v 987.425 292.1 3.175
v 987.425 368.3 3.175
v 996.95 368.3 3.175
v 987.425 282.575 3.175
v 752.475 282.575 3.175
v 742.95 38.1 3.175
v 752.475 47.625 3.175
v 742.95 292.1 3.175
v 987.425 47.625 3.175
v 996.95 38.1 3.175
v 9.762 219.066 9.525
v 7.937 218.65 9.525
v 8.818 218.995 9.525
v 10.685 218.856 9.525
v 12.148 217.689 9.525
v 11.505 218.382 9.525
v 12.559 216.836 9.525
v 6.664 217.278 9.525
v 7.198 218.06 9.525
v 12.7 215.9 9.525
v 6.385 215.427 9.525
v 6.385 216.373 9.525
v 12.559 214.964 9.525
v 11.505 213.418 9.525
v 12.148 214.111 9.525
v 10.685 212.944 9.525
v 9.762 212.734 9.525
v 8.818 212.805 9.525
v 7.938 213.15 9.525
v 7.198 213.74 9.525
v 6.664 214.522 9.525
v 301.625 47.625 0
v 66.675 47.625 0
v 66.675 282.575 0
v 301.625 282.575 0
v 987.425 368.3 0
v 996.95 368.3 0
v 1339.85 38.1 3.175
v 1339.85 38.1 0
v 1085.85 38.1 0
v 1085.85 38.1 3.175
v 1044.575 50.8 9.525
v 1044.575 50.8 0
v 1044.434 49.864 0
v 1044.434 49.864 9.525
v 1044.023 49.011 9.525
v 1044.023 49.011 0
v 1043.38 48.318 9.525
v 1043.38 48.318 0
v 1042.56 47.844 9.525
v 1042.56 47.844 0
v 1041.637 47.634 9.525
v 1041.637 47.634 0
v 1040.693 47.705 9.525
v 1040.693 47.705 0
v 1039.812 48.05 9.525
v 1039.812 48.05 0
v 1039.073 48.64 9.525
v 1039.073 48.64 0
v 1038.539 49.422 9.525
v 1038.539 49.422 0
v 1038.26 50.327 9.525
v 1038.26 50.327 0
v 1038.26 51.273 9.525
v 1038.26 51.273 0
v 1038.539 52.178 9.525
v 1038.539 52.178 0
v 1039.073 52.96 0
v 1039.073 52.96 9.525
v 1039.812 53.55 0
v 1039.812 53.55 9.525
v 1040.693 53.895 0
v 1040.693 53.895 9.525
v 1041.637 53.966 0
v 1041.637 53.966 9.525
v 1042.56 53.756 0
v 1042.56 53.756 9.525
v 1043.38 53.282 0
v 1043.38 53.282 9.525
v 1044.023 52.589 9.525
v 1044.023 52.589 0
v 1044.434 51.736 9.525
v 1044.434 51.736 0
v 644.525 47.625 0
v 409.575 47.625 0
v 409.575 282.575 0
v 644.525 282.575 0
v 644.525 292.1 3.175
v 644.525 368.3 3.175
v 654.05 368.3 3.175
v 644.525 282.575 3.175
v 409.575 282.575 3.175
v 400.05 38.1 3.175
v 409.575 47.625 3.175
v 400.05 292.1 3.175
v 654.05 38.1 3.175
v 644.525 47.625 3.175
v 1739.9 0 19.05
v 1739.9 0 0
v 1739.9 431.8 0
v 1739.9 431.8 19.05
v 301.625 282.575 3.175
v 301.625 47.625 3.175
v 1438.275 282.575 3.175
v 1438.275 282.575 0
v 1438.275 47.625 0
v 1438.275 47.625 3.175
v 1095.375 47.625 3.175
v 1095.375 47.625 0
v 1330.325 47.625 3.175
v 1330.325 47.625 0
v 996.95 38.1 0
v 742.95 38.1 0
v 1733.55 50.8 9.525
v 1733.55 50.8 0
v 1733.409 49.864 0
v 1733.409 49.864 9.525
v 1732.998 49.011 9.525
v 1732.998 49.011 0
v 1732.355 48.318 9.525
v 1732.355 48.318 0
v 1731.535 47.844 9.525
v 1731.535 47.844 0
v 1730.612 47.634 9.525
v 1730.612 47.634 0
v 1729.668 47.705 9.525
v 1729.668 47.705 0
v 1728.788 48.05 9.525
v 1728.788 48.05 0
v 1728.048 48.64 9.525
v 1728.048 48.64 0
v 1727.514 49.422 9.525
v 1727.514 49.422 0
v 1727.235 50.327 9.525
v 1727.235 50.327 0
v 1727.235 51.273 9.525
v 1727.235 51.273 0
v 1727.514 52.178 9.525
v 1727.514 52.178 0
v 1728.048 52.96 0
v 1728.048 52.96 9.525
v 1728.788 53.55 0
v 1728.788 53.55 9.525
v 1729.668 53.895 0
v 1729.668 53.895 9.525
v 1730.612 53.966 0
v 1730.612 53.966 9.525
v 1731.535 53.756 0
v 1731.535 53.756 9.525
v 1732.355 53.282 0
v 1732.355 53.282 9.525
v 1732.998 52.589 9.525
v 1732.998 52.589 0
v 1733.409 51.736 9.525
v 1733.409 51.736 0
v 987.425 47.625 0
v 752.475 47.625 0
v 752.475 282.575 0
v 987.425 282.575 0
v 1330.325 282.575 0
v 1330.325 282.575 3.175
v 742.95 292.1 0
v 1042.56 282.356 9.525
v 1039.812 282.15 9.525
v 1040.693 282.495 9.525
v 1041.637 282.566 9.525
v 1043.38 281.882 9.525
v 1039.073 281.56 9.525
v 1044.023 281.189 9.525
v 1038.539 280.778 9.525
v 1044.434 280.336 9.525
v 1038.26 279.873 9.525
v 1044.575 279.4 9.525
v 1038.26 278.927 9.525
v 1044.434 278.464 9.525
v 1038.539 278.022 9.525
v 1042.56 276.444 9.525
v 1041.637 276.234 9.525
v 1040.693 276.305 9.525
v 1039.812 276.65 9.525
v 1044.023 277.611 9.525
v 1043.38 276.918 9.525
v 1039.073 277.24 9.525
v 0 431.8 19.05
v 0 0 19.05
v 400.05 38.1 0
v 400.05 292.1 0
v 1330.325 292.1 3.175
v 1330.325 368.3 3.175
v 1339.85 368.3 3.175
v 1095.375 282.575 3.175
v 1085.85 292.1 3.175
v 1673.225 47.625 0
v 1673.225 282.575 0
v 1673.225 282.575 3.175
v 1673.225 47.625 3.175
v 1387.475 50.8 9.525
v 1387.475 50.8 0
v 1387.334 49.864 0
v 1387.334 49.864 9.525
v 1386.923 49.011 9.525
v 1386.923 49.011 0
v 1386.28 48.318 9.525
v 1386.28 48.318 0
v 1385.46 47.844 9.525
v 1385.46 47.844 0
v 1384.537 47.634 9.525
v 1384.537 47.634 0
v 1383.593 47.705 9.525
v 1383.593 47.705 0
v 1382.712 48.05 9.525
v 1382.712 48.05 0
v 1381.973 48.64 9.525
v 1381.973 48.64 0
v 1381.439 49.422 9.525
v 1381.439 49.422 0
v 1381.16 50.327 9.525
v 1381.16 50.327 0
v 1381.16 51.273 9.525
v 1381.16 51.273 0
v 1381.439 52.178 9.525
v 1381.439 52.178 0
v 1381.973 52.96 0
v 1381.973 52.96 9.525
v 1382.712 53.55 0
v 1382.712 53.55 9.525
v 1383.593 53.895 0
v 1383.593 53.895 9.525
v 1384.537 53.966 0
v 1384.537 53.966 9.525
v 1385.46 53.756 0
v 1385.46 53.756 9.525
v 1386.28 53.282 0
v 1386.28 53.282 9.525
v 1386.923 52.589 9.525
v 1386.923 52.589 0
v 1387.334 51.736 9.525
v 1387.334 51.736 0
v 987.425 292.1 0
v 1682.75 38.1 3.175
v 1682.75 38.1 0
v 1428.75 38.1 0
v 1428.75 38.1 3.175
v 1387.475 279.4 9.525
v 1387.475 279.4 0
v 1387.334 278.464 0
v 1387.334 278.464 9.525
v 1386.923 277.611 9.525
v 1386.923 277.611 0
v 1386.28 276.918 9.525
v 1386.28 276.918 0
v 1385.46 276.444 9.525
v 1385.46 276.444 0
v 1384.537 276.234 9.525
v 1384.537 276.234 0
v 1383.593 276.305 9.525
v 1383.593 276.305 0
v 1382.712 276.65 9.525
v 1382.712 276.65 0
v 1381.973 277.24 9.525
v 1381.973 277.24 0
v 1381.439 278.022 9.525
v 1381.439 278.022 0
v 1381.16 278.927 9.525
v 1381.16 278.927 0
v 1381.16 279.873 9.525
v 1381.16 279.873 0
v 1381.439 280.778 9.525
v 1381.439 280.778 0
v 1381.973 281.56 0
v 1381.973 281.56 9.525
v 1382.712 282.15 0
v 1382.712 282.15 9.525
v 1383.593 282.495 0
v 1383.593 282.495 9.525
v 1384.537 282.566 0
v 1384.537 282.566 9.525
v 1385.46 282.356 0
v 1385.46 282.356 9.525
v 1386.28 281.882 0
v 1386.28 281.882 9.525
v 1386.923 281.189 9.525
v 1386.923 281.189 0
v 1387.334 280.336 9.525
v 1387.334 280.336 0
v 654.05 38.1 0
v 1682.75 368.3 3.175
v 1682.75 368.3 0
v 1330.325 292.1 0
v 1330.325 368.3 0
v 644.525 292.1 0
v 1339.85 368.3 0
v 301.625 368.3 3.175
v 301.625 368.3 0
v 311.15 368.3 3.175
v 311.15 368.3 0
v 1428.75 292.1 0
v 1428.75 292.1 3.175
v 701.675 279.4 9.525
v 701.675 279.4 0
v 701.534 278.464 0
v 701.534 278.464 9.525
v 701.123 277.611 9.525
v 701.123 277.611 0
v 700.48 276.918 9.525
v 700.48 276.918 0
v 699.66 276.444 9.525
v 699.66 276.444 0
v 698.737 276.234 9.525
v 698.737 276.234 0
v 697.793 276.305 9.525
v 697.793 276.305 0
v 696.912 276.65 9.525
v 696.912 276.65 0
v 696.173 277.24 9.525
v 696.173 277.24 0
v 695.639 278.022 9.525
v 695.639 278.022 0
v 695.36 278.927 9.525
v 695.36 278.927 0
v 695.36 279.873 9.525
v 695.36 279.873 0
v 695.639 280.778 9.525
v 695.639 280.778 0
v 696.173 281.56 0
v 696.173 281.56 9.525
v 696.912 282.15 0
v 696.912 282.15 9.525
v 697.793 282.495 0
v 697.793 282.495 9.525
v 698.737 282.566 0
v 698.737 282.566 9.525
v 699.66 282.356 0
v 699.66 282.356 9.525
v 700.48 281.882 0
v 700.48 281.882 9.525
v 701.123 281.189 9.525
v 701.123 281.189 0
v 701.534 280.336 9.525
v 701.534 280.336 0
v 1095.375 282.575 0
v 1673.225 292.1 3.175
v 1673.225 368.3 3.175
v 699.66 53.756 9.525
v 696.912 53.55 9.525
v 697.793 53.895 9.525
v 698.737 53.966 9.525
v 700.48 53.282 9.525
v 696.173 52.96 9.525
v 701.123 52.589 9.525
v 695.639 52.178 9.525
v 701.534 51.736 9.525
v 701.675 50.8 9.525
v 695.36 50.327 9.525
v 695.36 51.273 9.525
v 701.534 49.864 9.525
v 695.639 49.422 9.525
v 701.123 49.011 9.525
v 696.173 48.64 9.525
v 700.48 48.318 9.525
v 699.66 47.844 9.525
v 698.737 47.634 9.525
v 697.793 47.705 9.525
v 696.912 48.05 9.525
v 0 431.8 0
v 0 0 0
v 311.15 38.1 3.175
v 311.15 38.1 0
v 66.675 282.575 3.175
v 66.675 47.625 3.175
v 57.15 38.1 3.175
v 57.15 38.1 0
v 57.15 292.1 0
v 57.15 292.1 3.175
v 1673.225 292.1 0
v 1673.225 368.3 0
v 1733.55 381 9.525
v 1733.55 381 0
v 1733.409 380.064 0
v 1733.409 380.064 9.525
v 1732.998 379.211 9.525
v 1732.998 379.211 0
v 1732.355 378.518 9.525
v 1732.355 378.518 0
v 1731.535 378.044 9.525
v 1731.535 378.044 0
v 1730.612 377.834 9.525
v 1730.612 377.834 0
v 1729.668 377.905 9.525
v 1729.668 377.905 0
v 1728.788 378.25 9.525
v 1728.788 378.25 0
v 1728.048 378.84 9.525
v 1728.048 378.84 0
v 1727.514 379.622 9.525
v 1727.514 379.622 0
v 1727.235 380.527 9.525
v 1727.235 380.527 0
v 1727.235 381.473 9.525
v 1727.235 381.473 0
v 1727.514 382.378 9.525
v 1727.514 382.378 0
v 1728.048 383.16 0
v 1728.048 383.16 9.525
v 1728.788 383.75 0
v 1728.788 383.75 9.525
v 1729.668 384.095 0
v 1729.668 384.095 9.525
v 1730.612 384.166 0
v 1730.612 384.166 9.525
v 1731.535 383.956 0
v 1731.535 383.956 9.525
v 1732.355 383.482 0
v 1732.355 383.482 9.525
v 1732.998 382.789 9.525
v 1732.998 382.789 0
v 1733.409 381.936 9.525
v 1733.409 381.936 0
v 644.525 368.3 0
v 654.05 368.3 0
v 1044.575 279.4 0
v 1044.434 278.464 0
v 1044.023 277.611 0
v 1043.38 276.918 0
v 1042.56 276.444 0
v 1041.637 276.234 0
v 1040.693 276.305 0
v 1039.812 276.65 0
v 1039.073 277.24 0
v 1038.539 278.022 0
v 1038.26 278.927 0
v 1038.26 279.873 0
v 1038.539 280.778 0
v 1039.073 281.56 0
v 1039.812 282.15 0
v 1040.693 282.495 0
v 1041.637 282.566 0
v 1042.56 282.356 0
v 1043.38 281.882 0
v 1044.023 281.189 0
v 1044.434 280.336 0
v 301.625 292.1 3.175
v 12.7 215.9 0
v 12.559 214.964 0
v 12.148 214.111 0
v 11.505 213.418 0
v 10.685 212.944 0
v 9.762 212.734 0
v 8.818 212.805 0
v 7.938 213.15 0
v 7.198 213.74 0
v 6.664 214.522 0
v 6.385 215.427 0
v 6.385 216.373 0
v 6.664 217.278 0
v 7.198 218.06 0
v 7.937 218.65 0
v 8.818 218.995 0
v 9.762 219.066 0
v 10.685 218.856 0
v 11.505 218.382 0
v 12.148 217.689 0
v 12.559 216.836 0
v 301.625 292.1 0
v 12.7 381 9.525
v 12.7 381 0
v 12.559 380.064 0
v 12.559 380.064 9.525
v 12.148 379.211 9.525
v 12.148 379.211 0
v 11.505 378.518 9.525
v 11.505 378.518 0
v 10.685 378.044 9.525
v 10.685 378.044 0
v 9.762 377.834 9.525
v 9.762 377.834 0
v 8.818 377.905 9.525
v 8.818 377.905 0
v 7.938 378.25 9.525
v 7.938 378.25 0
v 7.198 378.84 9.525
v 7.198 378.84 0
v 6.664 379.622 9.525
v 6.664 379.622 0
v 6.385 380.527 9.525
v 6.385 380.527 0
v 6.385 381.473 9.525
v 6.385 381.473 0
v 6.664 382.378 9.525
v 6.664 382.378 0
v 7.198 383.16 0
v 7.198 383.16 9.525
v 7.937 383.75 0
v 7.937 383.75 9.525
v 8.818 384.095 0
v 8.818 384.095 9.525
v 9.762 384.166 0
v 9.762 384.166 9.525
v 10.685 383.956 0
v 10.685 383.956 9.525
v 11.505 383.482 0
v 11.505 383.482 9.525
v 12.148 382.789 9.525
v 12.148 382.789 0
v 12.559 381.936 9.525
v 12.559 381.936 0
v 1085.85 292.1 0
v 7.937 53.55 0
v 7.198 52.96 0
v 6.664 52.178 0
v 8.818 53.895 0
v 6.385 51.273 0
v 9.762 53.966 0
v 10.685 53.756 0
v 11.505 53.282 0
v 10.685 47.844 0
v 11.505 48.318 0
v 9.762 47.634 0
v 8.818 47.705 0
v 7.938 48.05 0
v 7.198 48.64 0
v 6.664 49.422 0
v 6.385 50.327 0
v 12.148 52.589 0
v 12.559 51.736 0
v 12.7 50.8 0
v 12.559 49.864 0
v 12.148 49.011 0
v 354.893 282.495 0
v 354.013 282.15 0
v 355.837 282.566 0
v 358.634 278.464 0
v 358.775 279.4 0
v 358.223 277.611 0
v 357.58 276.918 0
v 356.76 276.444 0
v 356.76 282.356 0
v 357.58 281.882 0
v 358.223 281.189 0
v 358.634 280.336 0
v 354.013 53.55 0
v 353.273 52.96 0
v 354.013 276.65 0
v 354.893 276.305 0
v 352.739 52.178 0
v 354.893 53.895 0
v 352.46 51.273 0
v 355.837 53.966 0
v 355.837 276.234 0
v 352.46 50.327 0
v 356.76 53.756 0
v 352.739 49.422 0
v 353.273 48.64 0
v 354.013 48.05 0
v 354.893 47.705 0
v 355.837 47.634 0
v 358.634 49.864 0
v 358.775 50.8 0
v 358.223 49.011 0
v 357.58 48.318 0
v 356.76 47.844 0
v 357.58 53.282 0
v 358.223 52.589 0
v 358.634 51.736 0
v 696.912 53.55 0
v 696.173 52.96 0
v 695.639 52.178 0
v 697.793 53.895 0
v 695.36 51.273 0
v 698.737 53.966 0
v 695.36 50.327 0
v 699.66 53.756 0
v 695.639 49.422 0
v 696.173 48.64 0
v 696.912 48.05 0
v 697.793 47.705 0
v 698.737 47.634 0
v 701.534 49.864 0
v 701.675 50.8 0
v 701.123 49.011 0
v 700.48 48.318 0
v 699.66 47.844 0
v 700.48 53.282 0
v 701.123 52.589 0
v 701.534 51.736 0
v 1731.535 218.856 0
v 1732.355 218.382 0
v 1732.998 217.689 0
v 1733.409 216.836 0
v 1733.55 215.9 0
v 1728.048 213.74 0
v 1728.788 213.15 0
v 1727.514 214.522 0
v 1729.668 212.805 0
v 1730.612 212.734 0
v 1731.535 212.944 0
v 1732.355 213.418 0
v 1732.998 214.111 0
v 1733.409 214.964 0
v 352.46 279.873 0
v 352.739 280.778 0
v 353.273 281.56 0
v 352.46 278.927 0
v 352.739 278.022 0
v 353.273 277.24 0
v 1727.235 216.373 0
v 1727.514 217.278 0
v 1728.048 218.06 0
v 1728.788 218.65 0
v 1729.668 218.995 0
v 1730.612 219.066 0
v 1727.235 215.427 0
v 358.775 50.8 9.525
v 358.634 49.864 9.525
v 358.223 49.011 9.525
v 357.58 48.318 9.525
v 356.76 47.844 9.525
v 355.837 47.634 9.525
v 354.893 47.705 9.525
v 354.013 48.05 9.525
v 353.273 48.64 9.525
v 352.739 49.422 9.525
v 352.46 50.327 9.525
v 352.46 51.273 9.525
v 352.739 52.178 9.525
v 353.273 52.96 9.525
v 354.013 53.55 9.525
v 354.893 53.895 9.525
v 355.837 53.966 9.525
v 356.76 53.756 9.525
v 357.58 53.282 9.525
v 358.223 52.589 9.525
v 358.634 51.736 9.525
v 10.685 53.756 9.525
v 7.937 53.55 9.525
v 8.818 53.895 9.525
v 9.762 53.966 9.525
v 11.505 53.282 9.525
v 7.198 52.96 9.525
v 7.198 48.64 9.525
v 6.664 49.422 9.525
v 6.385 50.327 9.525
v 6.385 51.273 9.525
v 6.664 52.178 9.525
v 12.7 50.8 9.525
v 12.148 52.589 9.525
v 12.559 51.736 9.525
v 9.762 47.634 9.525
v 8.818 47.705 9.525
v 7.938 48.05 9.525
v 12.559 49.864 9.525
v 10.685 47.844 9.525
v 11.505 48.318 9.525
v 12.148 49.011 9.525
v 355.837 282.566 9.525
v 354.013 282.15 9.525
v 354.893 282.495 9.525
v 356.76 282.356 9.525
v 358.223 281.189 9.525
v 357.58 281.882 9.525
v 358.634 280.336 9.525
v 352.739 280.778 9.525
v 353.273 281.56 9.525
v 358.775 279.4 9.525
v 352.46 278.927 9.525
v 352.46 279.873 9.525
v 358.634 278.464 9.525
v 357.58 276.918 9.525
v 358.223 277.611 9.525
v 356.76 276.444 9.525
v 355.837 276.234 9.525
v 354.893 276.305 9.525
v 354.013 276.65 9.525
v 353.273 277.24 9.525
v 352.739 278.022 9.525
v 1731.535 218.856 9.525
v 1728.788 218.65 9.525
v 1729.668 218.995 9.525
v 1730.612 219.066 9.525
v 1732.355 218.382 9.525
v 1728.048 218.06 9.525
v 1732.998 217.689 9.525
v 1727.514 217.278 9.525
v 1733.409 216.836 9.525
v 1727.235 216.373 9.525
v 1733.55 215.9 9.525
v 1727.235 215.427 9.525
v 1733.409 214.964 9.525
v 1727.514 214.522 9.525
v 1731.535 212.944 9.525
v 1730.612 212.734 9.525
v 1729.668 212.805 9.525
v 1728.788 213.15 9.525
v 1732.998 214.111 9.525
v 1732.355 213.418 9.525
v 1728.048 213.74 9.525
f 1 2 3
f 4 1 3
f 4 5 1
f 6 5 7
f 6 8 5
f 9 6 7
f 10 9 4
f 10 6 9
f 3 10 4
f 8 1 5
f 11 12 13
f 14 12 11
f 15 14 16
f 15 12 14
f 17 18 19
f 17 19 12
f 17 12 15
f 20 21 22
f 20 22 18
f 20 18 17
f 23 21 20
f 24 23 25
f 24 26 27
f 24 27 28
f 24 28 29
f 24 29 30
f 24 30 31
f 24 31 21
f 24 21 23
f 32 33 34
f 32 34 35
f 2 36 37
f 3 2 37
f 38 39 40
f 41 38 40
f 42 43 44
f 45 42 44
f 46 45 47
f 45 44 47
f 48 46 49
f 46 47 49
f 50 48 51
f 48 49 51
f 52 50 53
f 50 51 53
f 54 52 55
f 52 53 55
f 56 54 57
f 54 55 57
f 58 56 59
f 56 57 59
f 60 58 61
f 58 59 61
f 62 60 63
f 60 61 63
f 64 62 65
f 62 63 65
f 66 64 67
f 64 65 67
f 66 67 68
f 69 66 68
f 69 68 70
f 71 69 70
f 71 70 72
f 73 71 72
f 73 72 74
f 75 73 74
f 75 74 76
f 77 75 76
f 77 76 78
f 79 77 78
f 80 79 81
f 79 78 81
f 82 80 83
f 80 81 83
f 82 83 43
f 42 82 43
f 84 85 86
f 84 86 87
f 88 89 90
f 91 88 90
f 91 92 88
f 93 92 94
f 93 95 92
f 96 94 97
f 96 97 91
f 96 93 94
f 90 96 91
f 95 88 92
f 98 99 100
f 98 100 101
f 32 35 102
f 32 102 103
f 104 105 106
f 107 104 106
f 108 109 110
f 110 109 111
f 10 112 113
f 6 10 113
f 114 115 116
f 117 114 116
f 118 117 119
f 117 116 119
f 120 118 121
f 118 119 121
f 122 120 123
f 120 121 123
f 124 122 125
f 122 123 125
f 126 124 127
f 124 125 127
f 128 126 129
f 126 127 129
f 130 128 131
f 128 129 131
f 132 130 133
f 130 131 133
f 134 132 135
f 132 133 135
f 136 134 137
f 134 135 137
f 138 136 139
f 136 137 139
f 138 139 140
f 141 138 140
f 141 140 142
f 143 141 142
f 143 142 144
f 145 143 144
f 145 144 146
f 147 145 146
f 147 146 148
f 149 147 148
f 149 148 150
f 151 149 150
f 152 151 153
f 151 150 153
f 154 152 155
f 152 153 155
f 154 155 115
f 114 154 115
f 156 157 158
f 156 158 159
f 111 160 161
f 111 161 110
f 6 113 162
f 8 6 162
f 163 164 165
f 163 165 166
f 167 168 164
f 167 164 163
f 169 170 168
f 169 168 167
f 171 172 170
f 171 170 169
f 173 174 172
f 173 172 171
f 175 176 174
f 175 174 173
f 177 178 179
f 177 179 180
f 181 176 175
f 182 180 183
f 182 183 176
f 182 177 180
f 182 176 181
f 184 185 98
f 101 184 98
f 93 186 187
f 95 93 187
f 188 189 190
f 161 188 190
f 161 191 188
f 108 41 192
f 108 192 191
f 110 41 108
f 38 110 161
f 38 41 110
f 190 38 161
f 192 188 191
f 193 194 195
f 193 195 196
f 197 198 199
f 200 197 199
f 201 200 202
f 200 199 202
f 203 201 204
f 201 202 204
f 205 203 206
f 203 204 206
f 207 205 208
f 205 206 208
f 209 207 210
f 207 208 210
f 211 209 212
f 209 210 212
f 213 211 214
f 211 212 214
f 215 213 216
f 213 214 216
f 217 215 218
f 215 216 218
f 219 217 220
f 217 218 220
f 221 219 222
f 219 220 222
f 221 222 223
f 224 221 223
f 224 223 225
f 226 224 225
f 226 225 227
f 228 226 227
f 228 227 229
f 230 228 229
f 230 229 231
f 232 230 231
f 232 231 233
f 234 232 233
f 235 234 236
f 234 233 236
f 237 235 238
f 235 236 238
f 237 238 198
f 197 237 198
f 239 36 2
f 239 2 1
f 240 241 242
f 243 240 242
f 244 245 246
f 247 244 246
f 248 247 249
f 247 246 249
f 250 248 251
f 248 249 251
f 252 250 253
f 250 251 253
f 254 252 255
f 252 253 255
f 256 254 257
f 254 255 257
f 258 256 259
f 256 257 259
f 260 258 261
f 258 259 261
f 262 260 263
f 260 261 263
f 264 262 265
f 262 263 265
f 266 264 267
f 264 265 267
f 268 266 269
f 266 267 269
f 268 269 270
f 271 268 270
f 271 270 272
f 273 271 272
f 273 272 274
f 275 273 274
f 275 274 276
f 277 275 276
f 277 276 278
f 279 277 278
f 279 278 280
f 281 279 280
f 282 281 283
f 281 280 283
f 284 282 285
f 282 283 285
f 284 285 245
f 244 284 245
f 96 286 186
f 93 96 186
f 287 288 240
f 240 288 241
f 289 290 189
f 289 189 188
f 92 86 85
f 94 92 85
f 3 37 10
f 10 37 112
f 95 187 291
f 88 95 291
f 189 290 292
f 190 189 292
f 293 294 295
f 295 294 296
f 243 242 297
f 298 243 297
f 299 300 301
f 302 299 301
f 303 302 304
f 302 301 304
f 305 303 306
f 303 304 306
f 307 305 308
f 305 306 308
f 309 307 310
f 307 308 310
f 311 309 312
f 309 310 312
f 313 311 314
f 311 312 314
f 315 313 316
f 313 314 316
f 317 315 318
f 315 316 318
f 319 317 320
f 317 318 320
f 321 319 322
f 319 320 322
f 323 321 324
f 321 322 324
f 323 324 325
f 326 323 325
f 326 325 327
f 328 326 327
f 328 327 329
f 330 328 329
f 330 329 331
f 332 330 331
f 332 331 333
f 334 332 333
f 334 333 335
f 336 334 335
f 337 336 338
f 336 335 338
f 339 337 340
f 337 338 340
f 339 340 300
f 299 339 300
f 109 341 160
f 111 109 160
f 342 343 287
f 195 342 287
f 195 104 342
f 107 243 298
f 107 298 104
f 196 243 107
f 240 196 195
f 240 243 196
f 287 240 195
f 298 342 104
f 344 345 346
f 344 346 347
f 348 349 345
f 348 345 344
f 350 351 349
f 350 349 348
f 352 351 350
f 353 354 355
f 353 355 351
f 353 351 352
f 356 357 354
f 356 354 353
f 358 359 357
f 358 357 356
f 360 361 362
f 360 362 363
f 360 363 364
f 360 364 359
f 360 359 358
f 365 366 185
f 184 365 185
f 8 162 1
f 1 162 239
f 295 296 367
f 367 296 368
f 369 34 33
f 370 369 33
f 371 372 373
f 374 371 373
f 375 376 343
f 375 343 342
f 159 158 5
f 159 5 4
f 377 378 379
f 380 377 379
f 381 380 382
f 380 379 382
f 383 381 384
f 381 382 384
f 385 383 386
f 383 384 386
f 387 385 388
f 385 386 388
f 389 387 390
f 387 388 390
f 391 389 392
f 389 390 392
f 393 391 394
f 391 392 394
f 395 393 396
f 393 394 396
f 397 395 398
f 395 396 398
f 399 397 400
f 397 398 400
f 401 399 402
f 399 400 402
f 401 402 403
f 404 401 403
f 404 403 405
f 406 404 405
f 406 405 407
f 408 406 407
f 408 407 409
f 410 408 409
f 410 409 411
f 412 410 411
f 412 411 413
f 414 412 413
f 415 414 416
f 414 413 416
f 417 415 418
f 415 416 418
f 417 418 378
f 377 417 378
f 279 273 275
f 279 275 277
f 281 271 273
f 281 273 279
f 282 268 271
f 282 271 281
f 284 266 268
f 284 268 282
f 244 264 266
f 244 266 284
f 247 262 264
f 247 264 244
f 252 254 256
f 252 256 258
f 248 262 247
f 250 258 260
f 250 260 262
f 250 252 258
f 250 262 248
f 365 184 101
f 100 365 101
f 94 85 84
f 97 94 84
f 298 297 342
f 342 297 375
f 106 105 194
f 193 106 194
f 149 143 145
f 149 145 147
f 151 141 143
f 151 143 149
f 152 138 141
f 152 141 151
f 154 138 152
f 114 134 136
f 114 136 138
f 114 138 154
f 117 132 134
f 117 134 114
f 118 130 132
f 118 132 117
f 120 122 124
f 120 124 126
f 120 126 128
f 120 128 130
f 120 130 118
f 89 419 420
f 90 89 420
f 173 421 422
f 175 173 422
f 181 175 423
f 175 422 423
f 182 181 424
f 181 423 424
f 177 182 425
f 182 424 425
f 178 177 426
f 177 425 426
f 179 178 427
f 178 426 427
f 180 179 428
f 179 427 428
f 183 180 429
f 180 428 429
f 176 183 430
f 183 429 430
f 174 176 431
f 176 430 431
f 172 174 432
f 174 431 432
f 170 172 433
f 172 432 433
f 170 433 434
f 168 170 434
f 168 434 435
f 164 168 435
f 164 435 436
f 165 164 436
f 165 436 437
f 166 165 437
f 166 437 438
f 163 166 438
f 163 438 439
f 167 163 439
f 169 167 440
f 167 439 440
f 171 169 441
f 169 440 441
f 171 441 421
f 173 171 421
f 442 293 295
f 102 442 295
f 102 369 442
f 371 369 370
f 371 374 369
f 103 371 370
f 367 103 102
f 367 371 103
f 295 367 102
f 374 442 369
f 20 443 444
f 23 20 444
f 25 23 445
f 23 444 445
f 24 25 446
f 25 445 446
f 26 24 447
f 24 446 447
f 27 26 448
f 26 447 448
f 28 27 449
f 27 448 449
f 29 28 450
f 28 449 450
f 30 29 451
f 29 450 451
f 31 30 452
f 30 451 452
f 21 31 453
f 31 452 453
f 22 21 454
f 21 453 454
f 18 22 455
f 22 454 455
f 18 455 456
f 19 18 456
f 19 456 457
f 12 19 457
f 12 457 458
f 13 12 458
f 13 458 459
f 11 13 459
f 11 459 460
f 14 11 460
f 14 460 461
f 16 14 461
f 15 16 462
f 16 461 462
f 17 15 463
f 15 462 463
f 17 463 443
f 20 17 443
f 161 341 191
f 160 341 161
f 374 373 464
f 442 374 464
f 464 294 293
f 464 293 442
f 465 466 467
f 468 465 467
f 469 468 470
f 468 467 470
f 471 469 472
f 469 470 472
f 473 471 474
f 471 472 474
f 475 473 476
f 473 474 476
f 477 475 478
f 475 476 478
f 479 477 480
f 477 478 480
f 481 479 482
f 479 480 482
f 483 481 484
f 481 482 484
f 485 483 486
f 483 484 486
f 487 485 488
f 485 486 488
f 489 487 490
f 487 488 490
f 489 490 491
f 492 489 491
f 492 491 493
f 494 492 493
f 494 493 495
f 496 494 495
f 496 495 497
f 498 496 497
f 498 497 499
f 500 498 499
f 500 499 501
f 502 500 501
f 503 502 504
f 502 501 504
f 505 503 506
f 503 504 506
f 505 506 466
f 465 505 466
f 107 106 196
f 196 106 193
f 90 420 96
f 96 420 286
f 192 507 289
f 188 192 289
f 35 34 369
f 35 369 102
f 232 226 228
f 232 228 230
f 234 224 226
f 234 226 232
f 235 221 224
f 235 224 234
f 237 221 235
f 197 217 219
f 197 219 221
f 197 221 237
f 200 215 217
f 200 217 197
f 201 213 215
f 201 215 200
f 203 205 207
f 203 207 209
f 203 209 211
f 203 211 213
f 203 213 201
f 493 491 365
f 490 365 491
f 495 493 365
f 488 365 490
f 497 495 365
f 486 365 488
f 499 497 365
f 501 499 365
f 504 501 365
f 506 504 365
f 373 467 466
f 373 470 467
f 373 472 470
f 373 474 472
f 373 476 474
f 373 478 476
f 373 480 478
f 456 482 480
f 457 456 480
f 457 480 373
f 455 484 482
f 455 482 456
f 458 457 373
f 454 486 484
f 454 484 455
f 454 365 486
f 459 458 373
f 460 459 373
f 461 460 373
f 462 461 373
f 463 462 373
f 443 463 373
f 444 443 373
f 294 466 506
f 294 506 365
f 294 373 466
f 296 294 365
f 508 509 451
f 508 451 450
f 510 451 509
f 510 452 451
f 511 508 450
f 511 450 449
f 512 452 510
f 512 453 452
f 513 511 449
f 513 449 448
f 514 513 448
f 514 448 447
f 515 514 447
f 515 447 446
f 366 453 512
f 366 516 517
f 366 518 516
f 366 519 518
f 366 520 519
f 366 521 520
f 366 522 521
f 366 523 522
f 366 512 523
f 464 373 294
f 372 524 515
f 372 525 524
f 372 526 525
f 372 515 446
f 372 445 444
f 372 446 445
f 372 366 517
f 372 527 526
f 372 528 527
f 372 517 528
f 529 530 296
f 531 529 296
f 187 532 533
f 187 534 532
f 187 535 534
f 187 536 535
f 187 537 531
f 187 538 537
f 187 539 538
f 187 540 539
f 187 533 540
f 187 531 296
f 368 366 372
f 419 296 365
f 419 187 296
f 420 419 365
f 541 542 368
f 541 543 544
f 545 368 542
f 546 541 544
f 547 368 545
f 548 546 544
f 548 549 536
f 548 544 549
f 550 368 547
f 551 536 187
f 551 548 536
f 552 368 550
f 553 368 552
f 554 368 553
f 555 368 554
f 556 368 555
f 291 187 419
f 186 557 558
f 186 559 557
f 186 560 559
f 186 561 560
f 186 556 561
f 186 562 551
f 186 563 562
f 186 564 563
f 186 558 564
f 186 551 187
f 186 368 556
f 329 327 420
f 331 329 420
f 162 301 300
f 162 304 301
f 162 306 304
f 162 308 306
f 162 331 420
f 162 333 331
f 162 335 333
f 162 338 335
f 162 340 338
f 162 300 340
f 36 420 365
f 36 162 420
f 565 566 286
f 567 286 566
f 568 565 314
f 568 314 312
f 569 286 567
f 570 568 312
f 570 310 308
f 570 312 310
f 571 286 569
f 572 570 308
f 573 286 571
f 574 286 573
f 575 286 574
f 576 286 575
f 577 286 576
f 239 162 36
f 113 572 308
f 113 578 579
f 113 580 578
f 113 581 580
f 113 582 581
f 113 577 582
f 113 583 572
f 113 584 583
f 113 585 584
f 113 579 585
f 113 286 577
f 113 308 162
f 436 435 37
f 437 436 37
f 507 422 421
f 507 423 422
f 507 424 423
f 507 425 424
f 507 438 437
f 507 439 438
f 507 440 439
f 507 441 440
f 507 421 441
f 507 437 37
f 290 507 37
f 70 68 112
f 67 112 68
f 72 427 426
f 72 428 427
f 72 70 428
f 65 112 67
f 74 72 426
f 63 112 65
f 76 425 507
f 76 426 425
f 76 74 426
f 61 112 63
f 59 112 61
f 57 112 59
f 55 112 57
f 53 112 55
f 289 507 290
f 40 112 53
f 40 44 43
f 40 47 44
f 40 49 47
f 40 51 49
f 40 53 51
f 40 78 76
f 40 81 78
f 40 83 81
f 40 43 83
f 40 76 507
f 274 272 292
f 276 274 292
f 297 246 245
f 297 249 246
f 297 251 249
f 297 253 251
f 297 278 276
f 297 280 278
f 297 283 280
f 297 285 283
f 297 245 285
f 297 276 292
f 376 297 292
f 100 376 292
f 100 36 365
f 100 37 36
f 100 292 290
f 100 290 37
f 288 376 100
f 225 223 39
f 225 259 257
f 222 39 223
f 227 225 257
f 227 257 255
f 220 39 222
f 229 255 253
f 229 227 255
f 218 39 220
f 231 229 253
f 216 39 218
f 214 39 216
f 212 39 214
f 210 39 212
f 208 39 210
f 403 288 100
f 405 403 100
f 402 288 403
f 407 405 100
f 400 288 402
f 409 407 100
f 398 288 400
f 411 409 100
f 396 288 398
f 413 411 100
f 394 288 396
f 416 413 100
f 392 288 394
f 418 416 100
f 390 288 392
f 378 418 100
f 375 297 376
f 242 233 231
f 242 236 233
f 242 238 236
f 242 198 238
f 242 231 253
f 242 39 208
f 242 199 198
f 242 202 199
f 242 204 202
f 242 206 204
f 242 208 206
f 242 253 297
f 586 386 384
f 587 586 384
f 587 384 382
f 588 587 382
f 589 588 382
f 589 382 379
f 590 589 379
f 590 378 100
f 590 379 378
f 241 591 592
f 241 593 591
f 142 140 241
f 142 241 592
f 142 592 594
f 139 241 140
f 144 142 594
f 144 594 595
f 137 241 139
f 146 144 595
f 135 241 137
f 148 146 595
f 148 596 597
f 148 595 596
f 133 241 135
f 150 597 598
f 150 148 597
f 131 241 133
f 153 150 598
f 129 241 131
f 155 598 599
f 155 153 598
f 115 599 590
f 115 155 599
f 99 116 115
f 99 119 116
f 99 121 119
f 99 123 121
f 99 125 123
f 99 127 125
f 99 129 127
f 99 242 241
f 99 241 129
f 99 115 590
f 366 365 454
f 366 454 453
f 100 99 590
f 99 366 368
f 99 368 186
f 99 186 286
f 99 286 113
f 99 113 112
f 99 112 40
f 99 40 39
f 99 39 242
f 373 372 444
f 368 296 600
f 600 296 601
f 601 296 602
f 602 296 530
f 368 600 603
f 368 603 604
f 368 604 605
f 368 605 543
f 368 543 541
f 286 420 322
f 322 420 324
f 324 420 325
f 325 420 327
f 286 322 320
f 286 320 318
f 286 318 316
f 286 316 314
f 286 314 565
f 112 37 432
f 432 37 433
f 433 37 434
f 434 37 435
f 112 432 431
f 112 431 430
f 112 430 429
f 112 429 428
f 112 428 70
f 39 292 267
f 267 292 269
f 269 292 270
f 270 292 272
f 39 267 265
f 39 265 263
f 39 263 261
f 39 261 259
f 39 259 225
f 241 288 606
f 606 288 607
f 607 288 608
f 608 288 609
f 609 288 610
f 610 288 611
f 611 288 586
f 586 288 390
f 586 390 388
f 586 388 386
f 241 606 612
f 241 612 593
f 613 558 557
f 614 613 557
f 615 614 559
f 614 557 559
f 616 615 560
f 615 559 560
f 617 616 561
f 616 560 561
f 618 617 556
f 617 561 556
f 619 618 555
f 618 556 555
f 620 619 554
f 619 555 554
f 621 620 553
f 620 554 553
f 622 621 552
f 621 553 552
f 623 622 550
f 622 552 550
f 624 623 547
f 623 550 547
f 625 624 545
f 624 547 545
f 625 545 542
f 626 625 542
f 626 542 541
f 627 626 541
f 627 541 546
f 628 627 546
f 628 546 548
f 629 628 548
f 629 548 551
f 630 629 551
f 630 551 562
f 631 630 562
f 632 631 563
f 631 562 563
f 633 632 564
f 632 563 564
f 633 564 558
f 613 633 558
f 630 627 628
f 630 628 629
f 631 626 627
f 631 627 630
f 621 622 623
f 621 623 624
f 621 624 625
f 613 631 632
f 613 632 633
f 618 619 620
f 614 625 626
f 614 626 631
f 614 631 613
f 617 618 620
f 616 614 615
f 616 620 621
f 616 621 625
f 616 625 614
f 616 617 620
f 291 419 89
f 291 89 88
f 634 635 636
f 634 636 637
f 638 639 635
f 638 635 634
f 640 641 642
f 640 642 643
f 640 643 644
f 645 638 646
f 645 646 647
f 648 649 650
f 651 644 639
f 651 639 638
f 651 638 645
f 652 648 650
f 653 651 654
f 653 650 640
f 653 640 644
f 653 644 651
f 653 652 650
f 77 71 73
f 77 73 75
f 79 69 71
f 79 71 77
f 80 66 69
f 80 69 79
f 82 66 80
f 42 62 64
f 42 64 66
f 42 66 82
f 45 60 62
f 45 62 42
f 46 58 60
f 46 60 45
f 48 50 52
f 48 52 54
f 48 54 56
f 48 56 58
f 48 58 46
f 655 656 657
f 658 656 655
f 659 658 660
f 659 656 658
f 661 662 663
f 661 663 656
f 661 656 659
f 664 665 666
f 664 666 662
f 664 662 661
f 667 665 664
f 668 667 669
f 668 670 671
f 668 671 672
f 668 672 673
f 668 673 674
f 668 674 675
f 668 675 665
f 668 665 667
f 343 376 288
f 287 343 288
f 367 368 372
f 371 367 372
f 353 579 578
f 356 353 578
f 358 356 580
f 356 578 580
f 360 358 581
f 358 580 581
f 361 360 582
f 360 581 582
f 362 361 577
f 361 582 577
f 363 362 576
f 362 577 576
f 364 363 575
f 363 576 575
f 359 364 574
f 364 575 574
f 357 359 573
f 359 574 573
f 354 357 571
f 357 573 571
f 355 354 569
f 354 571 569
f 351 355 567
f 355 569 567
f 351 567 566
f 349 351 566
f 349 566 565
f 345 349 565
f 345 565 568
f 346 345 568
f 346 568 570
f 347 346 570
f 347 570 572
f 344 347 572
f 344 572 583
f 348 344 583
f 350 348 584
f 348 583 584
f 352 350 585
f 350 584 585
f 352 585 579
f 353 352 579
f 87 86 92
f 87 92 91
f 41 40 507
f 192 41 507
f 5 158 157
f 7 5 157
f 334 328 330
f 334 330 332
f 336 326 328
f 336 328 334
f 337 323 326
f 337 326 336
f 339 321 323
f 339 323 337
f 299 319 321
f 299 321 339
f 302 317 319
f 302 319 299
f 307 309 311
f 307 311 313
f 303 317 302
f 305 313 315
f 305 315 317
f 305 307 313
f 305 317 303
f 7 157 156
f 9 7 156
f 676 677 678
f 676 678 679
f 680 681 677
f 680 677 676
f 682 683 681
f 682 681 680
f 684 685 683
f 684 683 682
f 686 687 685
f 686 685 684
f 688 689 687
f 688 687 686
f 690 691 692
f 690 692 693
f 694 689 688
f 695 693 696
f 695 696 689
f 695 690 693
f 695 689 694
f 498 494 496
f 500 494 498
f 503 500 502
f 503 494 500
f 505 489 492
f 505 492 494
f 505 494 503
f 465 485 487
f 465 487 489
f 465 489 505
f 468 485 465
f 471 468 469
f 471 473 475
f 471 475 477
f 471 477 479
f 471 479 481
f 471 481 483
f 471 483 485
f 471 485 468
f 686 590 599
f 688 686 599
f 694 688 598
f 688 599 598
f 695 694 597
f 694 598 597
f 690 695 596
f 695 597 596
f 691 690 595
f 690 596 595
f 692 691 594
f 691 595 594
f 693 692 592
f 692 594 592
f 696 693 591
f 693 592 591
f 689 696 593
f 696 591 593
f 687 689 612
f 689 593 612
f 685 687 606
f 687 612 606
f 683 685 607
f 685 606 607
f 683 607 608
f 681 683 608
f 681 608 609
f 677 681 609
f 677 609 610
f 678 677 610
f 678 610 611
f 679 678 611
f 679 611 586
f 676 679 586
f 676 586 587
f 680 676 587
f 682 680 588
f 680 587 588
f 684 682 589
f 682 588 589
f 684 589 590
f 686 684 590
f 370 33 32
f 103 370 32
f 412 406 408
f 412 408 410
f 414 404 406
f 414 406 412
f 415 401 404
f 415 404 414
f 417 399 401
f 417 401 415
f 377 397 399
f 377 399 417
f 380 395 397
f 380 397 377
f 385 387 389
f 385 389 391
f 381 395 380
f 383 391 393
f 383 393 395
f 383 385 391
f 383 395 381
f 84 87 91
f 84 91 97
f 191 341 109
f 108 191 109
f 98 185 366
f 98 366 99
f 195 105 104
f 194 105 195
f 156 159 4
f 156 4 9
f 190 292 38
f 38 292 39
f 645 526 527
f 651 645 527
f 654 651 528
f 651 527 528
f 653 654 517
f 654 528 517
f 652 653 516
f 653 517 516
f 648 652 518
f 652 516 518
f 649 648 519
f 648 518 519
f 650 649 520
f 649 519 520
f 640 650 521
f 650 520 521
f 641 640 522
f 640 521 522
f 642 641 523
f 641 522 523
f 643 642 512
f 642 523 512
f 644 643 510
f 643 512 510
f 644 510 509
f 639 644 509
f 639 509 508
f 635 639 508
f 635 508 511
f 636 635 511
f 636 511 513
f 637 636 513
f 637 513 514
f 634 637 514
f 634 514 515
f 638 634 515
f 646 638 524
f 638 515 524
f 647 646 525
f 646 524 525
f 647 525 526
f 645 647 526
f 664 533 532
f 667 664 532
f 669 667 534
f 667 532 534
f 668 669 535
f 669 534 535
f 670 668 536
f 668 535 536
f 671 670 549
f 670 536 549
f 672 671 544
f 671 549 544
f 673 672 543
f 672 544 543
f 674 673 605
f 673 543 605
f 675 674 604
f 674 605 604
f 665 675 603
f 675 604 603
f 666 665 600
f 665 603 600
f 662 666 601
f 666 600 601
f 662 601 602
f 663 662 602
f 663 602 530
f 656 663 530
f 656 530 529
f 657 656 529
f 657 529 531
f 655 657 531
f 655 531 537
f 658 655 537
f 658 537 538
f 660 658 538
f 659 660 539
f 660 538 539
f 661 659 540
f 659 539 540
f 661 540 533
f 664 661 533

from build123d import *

# Parameters (mm, degrees)
F0_W     = 1739.9
F0_H     = 19.05
F1_DEPTH = 431.8
F2_R     = 3.175
F3_DEPTH = 9.525
F4_W     = 9.525
F4_H     = 76.2
F4_W_2   = 234.95
F4_H_2   = 234.95
F5_DEPTH = 3.175


with BuildPart() as f1:
    # F0 (on Front) → F1 (new body)
    with BuildSketch(Plane.XZ):
        with Locations((869.95, 9.525)):
            Rectangle(F0_W, F0_H)
    extrude(amount=-F1_DEPTH)

    # F2 (on face) → F3 (cut)
    with BuildSketch(Plane(origin=(0, 0, 0), x_dir=(1, 0, 0), z_dir=(0, 0, -1))):
        with Locations((1730.375, -381)):
            Circle(F2_R)
        with Locations((1730.375, -215.9)):
            Circle(F2_R)
        with Locations((1730.375, -50.8)):
            Circle(F2_R)
        with Locations((9.525, -381)):
            Circle(F2_R)
        with Locations((9.525, -215.9)):
            Circle(F2_R)
        with Locations((9.525, -50.8)):
            Circle(F2_R)
        with Locations((1384.3, -50.8)):
            Circle(F2_R)
        with Locations((1384.3, -279.4)):
            Circle(F2_R)
        with Locations((698.5, -50.8)):
            Circle(F2_R)
        with Locations((355.6, -279.4)):
            Circle(F2_R)
        with Locations((698.5, -279.4)):
            Circle(F2_R)
        with Locations((1041.4, -50.8)):
            Circle(F2_R)
        with Locations((1041.4, -279.4)):
            Circle(F2_R)
        with Locations((355.6, -50.8)):
            Circle(F2_R)
    extrude(amount=-F3_DEPTH, mode=Mode.SUBTRACT)

    # F4 (on face) → F5 (cut)
    with BuildSketch(Plane(origin=(0, 0, 0), x_dir=(1, 0, 0), z_dir=(0, 0, -1))):
        with Locations((1677.9875, -330.2)):
            Rectangle(F4_W, F4_H)
        Polygon((1673.225, -292.1), (1682.75, -292.1), (1682.75, -38.1), (1428.75, -38.1), (1428.75, -292.1), align=None)
        with Locations((1555.75, -165.1)):
            Rectangle(F4_W_2, F4_H_2, mode=Mode.SUBTRACT)
        with Locations((1335.0875, -330.2)):
            Rectangle(F4_W, F4_H)
        Polygon((1330.325, -292.1), (1339.85, -292.1), (1339.85, -38.1), (1085.85, -38.1), (1085.85, -292.1), align=None)
        with Locations((1212.85, -165.1)):
            Rectangle(F4_W_2, F4_H_2, mode=Mode.SUBTRACT)
        with Locations((992.1875, -330.2)):
            Rectangle(F4_W, F4_H)
        Polygon((987.425, -292.1), (996.95, -292.1), (996.95, -38.1), (742.95, -38.1), (742.95, -292.1), align=None)
        with Locations((869.95, -165.1)):
            Rectangle(F4_W_2, F4_H_2, mode=Mode.SUBTRACT)
        with Locations((649.2875, -330.2)):
            Rectangle(F4_W, F4_H)
        Polygon((644.525, -292.1), (654.05, -292.1), (654.05, -38.1), (400.05, -38.1), (400.05, -292.1), align=None)
        with Locations((527.05, -165.1)):
            Rectangle(F4_W_2, F4_H_2, mode=Mode.SUBTRACT)
        with Locations((306.3875, -330.2)):
            Rectangle(F4_W, F4_H)
        Polygon((301.625, -292.1), (311.15, -292.1), (311.15, -38.1), (57.15, -38.1), (57.15, -292.1), align=None)
        with Locations((184.15, -165.1)):
            Rectangle(F4_W_2, F4_H_2, mode=Mode.SUBTRACT)
    extrude(amount=-F5_DEPTH, mode=Mode.SUBTRACT)


solid = f1.part
